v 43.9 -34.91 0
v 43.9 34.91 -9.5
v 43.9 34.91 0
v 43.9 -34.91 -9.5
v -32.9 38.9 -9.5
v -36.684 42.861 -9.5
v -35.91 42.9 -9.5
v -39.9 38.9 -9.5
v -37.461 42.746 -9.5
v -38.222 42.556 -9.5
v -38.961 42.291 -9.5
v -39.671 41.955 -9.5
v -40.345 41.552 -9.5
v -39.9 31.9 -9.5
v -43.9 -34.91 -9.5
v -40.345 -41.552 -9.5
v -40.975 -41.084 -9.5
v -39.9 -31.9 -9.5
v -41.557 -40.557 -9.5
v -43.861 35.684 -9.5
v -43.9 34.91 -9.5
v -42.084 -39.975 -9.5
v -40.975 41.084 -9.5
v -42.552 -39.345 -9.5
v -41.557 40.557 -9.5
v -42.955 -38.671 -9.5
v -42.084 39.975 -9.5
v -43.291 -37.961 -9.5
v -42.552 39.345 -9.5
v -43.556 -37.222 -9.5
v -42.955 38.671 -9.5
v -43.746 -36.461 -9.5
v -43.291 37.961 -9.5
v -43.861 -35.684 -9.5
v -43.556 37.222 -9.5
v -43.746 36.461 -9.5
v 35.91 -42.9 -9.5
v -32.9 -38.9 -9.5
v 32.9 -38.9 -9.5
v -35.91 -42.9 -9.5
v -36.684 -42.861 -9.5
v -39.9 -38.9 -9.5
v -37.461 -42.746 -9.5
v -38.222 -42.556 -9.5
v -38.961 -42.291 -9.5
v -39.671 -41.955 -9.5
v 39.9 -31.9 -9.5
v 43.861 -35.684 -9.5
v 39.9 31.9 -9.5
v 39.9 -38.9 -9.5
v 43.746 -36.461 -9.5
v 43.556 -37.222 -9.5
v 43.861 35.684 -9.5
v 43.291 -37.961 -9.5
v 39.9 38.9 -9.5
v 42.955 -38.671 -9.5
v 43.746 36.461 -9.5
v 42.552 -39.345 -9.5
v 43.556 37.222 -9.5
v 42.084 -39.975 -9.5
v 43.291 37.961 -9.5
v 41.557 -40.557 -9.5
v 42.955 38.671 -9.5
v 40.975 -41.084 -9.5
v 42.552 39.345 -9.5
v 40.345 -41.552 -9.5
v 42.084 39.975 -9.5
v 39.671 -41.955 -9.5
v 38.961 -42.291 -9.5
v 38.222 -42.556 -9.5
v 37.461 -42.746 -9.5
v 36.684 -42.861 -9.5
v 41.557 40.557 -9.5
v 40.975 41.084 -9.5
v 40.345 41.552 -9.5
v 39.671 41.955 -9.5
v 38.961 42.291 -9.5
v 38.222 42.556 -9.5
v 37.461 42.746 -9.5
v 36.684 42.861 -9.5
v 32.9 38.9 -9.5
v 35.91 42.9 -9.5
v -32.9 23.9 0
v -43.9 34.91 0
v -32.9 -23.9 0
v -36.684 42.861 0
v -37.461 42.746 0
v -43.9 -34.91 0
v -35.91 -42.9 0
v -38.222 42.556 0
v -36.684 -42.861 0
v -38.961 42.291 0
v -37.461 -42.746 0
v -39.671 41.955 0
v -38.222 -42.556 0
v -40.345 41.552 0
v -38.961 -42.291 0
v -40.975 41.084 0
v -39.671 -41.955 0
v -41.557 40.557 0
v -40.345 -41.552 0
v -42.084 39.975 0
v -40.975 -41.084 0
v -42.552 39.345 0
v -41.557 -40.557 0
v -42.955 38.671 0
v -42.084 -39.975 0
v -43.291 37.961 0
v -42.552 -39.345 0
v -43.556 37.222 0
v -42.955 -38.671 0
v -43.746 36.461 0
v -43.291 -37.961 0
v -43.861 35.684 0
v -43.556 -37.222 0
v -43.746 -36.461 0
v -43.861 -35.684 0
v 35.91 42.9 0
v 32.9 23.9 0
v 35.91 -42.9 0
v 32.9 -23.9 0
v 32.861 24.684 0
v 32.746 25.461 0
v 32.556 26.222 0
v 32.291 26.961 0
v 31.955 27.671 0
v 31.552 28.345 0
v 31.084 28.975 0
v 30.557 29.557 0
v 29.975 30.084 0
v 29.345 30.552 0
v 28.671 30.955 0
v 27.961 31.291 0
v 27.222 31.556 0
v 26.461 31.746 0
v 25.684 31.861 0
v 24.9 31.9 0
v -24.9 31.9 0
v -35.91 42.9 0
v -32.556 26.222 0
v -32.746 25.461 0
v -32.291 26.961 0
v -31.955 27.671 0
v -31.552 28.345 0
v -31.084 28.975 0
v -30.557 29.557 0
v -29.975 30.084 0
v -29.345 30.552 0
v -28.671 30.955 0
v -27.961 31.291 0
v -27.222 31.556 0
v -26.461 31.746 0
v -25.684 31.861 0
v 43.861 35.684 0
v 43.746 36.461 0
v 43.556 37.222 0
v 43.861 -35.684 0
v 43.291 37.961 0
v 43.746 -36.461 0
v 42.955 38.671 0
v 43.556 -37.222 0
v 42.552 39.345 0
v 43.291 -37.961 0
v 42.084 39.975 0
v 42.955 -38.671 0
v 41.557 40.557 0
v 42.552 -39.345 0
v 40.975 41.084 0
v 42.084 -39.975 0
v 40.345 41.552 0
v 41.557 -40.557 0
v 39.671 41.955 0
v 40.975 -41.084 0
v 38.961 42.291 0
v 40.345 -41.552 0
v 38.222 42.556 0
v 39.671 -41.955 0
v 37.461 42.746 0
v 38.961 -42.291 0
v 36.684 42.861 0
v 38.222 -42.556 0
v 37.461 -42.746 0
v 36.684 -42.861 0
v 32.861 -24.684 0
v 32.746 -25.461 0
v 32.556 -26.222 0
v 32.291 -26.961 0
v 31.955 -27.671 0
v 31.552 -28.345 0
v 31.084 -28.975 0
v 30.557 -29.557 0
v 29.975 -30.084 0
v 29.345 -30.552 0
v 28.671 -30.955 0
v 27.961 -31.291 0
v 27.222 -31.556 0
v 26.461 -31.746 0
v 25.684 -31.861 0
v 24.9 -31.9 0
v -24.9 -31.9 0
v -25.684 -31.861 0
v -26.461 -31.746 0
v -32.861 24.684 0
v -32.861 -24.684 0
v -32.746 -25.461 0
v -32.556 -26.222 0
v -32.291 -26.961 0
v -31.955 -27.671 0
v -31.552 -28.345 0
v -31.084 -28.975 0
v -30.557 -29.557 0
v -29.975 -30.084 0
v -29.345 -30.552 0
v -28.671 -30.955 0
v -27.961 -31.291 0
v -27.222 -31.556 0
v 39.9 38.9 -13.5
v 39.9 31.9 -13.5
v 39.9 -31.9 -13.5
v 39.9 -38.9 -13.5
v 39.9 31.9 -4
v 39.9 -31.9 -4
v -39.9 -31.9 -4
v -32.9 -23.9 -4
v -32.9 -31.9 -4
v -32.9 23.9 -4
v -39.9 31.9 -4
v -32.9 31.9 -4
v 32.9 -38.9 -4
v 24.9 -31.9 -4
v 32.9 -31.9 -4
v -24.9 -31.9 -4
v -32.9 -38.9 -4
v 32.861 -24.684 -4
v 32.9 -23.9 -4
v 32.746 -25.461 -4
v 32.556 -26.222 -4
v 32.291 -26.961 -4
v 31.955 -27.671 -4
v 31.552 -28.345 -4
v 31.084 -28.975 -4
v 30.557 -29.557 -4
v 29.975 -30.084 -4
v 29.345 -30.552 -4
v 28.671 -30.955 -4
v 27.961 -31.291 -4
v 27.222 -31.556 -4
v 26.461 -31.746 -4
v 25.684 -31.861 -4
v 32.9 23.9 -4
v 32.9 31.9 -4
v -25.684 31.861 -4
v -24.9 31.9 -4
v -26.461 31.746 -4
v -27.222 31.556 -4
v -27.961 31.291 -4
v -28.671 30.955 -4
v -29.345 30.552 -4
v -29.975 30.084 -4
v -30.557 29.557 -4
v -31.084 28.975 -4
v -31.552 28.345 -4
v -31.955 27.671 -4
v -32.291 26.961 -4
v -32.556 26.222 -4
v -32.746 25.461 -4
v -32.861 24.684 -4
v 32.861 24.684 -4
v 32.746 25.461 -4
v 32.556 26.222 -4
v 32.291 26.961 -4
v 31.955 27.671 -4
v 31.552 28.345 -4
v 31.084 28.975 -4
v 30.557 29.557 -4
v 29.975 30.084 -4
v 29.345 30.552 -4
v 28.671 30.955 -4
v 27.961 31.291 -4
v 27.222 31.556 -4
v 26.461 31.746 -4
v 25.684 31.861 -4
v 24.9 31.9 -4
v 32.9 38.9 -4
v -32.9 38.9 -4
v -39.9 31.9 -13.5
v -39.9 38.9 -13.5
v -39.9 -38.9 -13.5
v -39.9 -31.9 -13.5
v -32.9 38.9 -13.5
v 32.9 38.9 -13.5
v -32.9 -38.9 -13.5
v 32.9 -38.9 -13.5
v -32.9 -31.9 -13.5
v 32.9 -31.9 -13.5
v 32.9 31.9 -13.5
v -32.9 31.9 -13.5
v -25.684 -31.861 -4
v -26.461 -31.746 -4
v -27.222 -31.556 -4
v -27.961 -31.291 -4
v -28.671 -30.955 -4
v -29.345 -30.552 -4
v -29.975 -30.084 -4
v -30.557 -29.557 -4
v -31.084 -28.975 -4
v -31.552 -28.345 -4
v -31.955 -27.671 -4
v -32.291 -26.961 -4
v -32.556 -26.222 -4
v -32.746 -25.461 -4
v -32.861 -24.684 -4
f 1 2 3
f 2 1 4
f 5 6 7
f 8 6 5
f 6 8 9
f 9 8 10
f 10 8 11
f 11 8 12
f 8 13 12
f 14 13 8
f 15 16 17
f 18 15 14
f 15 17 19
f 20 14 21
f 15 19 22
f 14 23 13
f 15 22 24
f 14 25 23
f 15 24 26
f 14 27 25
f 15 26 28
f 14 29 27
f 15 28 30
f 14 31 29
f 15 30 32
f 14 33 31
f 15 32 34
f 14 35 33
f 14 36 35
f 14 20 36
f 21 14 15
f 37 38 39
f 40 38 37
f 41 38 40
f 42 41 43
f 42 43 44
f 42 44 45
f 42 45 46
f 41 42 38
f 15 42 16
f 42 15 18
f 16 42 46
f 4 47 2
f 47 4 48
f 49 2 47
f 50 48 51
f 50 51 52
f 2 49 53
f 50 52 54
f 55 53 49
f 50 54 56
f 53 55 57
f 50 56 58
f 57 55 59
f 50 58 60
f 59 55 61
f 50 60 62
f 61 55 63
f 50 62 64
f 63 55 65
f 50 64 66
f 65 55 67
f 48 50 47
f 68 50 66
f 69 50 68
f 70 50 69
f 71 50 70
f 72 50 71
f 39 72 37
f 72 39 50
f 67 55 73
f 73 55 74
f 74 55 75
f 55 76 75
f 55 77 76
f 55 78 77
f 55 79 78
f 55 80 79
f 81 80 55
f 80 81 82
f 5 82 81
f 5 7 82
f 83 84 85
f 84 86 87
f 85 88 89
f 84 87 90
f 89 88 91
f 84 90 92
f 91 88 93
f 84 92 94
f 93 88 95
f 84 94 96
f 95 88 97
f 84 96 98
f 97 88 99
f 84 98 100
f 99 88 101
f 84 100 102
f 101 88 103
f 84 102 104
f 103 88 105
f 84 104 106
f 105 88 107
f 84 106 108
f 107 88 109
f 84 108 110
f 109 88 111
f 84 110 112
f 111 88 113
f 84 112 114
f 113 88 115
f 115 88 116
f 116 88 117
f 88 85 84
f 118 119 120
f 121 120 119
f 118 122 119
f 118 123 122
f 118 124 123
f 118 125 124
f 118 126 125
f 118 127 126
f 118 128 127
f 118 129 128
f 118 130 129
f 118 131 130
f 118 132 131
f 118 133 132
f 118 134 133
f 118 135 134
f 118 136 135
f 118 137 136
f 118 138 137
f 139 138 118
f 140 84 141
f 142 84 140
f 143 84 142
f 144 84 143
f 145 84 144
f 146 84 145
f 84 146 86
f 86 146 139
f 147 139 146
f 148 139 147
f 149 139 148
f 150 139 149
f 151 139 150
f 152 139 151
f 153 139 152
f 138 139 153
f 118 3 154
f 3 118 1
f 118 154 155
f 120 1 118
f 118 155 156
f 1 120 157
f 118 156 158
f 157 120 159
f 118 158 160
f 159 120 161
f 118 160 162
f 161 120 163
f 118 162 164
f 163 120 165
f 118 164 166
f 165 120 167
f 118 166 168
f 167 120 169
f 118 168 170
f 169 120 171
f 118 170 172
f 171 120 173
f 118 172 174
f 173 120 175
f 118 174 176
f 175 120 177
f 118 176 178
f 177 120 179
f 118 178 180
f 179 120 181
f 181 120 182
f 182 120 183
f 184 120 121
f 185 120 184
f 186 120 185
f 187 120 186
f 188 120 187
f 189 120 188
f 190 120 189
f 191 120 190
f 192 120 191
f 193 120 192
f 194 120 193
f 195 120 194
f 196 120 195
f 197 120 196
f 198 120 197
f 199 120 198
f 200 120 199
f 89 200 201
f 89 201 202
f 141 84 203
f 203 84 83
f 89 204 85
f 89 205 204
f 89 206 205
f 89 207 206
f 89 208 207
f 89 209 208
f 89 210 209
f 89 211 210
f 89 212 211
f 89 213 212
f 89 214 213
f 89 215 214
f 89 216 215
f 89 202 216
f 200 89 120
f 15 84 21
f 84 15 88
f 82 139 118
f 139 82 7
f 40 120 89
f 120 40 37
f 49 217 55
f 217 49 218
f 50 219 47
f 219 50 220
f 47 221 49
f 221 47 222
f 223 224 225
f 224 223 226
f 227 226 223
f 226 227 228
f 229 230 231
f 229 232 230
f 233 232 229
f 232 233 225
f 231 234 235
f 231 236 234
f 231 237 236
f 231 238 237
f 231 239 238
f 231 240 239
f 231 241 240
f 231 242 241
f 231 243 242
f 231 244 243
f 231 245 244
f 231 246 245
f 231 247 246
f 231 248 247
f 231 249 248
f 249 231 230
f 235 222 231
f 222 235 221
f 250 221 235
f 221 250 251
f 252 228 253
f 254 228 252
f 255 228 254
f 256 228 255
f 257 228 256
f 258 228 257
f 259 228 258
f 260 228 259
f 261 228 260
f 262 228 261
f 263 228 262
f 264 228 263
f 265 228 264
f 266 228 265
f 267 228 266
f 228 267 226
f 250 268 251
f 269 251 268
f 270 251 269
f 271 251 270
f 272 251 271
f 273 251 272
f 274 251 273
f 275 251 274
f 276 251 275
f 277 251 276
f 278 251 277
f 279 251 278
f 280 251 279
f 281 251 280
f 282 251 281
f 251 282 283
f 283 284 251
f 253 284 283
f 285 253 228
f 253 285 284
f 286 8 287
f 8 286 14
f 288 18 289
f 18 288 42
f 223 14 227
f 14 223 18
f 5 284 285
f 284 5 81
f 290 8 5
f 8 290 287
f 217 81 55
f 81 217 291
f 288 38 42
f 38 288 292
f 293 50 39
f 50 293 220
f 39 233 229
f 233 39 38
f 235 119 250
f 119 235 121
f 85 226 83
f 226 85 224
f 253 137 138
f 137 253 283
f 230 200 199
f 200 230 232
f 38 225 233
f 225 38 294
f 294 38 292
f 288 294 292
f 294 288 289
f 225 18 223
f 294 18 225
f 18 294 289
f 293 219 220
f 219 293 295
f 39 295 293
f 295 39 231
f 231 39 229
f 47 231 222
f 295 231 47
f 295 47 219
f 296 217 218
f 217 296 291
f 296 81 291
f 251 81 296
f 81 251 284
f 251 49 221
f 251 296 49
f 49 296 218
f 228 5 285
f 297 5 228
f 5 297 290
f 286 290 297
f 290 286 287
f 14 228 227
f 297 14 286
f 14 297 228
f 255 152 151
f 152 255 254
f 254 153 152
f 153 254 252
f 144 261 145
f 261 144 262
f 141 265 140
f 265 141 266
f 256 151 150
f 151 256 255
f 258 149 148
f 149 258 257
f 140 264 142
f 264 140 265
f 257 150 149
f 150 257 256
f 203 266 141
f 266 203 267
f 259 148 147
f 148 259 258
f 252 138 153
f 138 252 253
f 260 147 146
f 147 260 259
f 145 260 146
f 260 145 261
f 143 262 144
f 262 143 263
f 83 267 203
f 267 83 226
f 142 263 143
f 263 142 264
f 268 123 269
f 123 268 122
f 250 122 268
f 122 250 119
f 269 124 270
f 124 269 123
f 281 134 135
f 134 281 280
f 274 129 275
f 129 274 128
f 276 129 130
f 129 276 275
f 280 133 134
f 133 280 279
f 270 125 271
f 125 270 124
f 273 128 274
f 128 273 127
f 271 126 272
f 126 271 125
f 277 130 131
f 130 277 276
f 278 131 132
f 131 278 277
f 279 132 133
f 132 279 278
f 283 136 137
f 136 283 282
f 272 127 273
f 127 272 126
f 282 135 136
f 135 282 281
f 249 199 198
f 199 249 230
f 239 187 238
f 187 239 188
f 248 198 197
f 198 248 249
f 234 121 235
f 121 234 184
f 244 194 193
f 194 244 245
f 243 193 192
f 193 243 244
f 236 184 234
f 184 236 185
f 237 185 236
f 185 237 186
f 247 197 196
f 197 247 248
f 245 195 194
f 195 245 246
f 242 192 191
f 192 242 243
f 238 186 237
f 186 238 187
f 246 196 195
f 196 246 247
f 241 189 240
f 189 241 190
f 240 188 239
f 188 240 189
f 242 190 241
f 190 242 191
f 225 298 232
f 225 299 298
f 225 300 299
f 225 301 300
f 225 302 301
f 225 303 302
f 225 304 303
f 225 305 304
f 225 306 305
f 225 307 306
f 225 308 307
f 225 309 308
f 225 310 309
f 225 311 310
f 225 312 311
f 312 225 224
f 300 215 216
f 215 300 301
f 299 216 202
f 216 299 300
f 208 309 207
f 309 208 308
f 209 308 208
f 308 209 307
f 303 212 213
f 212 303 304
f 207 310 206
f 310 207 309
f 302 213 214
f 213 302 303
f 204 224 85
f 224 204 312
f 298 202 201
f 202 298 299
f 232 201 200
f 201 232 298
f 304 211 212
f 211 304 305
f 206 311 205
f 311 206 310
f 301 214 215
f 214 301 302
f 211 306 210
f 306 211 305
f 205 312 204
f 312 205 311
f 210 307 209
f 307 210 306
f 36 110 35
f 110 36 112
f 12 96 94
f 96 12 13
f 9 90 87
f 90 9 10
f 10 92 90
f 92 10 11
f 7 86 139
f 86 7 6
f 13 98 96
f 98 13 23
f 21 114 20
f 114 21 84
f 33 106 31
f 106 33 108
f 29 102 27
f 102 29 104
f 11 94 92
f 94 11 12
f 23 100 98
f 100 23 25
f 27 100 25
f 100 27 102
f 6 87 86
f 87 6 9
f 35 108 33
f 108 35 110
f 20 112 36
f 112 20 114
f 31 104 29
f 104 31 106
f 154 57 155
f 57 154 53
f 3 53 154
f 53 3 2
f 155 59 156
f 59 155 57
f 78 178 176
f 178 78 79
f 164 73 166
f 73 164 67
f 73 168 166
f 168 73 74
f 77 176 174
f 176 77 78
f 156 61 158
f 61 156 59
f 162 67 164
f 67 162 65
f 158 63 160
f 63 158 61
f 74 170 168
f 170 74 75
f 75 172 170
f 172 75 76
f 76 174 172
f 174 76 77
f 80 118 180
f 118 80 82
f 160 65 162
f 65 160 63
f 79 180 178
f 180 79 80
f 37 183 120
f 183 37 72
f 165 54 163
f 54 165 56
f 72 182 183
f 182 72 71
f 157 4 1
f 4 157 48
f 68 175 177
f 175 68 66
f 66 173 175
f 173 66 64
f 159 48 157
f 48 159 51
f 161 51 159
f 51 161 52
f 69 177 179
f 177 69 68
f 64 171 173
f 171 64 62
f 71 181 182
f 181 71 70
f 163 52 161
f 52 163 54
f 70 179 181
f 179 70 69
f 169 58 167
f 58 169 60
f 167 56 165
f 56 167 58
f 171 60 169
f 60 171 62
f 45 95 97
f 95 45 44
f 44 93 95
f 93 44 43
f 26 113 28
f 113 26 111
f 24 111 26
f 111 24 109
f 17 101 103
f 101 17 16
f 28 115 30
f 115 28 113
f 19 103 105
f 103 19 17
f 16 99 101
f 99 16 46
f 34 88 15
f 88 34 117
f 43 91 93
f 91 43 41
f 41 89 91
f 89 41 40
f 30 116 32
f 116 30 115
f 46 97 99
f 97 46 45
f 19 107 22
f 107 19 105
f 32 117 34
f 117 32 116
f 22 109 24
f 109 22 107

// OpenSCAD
// Box for beagleboard, (c) 2010 - Koen Kooi, licensed under CC-BY-SA

// lenght of PCB
inside_length = 77.8;

// width of PCB
inside_w = 79.8;

// outside wall thickness
edge_thickness = 4;
stud_height = edge_thickness + 3.5 + 6;

// Set this to zero have a 'coaster' instead of a box
extra_height = -6;

// stud is inside the wall but aligned to the bottom, 
// so its stud_size x stud_size x (stud_height - edge_thickness) big
stud_size = 7;
pcb_thickness = 2;

// Round the inside and outside corners
use_rounded_corners = 1; // 0,1

inside_corner_radius = 8;
corner_radius = 8;

box_width = inside_w + (edge_thickness * 2); 
box_length = inside_length + (edge_thickness * 2);
box_height = stud_height + pcb_thickness + extra_height;

mirror(v=[0,0,1]) translate(v = [ -box_width / 2, -box_length / 2, 0]) {   
  if(use_rounded_corners == 1) {
    roundedbox(box_width, box_length, box_height, edge_thickness, stud_size);
  } else {
    plainbox(box_width, box_length, box_height, edge_thickness, stud_size);
  }
}

module plainbox(box_width, box_length, box_height, edge_thickness, stud_size) {
  union() {
    difference() {
      //outside
      cube([box_width, box_length, box_height]);
      //inside
      translate(v = [edge_thickness, edge_thickness, edge_thickness]) {  
        cube([inside_w, inside_length, box_height]);
      }
      translate(v = [stud_size + edge_thickness, stud_size + edge_thickness, -edge_thickness]) {  
        cube([inside_w - 2 * stud_size, inside_length - 2 * stud_size, box_height]);
      }
      //audio: 62mm long, 10mm corner offset
      translate(v = [10 + edge_thickness, -0.01, stud_height + pcb_thickness]) {
        cube([62, edge_thickness + 0.02, extra_height + 0.01], center=false);
      }
      //sd: 45mm long, 9mm corner offset
      translate(v = [9 + edge_thickness, box_length - edge_thickness - 0.01, stud_height + pcb_thickness]) {
        cube([45, edge_thickness + 0.02, extra_height + 0.01], center=false);
      }
      //power: 23mm long, 21mm corner offset
      translate(v = [-0.01, 21 + edge_thickness, stud_height + pcb_thickness]) {
        cube([edge_thickness + 0.02, 23, extra_height + 0.01], center=false);
      }
    } // end difference
    //support studs
    translate(v = [edge_thickness, edge_thickness, 0]) {
      cube([stud_size, stud_size, stud_height], center = false);
    }
    translate(v = [box_width - stud_size - edge_thickness, edge_thickness, 0]) {
      cube([stud_size, stud_size, stud_height], center = false);
    }
    translate(v = [box_width - stud_size - edge_thickness, box_length - stud_size - edge_thickness, 0]) {
      cube([stud_size, stud_size, stud_height], center = false);
    }
    translate(v = [edge_thickness, box_length - stud_size - edge_thickness, 0]) {
      cube([stud_size, stud_size, stud_height], center = false);
    }
  } // end union
}

module roundedbox(box_width, box_length, box_height, edge_thickness, stud_size) {
  difference() {
    union() {
      plainbox(box_width, box_length, box_height, edge_thickness, stud_size);
  
        //rounded corner topleft
        translate(v = [edge_thickness + stud_size, box_length - edge_thickness - stud_size, 0]) {
          difference() {
            translate(v=[0,-inside_corner_radius,0]) {
              cube([inside_corner_radius,inside_corner_radius,edge_thickness]);
            }
            translate(v=[inside_corner_radius, -inside_corner_radius, -edge_thickness]) {
              cylinder(r=inside_corner_radius, h=3*edge_thickness, $fn=64);
            }
          }
        }
        //rounded corner topright
        translate(v = [box_width - edge_thickness - stud_size, box_length - edge_thickness - stud_size, 0]) {
          difference() {
            translate(v=[-inside_corner_radius,-inside_corner_radius,0]) {
              cube([inside_corner_radius,inside_corner_radius,edge_thickness]);
            }
            translate(v=[-inside_corner_radius, -inside_corner_radius, -edge_thickness]) {
              cylinder(r=inside_corner_radius, h=3*edge_thickness, $fn=64);
            }
          }
        }
        //rounded corner bottomright
        translate(v = [box_width - edge_thickness - stud_size, edge_thickness + stud_size, 0]) {
          difference() {
            translate(v=[-inside_corner_radius,0,0]) {
              cube([inside_corner_radius,inside_corner_radius,edge_thickness]);
            }
            translate(v=[-inside_corner_radius, inside_corner_radius, -edge_thickness]) {
              cylinder(r=inside_corner_radius, h=3*edge_thickness, $fn=64);
            }
          }
        }
        //rounded corner bottomleft
        translate(v = [edge_thickness + stud_size, edge_thickness + stud_size, 0]) {
          difference() {
            translate(v=[0,0,0]) {
              cube([inside_corner_radius,inside_corner_radius,edge_thickness]);
            }
            translate(v=[inside_corner_radius, inside_corner_radius, -edge_thickness]) {
              cylinder(r=inside_corner_radius, h=3*edge_thickness, $fn=64);
            }
          }
        }
    } //end union

    //rounded corner topleft
    translate(v = [0, box_length, 0]) {
      difference() {
        translate(v=[0 - 0.01,-corner_radius + 0.01, -0.5 * box_height]) {
          cube([corner_radius,corner_radius,2*box_height]);
        }
        translate(v=[corner_radius, -corner_radius, -0.5 * box_height]) {
          cylinder(r=corner_radius, h=2*box_height, $fn=64);
        }
      }
    }
    //rounded corner topright
    translate(v = [box_width, box_length, 0]) {
      difference() {
        translate(v=[-corner_radius + 0.01,-corner_radius + 0.01, -0.5 * box_height]) {
          cube([corner_radius,corner_radius,2*box_height]);
        }
        translate(v=[-corner_radius, -corner_radius, -0.5 * box_height]) {
          cylinder(r=corner_radius, h=2*box_height, $fn=64);
        }
      }
    }
    //rounded corner bottomright
    translate(v = [box_width, 0, 0]) {
      difference() {
        translate(v=[-corner_radius + 0.01,0 - 0.01, -0.5 * box_height]) {
          cube([corner_radius,corner_radius,2*box_height]);
        }
        translate(v=[-corner_radius, corner_radius, -0.5 * box_height]) {
          cylinder(r=corner_radius, h=2*box_height, $fn=64);
        }
      }
    }
    //rounded corner bottomleft
    translate(v = [0, 0, 0]) {
      difference() {
        translate(v=[0-0.01, -0.01, -0.5 * box_height]) {
          cube([corner_radius ,corner_radius,2*box_height]);
        }
        translate(v=[corner_radius, corner_radius, -0.5 * box_height]) {
          cylinder(r=corner_radius, h=2*box_height, $fn=64);
        }
      }
    }
  } //end difference
}
